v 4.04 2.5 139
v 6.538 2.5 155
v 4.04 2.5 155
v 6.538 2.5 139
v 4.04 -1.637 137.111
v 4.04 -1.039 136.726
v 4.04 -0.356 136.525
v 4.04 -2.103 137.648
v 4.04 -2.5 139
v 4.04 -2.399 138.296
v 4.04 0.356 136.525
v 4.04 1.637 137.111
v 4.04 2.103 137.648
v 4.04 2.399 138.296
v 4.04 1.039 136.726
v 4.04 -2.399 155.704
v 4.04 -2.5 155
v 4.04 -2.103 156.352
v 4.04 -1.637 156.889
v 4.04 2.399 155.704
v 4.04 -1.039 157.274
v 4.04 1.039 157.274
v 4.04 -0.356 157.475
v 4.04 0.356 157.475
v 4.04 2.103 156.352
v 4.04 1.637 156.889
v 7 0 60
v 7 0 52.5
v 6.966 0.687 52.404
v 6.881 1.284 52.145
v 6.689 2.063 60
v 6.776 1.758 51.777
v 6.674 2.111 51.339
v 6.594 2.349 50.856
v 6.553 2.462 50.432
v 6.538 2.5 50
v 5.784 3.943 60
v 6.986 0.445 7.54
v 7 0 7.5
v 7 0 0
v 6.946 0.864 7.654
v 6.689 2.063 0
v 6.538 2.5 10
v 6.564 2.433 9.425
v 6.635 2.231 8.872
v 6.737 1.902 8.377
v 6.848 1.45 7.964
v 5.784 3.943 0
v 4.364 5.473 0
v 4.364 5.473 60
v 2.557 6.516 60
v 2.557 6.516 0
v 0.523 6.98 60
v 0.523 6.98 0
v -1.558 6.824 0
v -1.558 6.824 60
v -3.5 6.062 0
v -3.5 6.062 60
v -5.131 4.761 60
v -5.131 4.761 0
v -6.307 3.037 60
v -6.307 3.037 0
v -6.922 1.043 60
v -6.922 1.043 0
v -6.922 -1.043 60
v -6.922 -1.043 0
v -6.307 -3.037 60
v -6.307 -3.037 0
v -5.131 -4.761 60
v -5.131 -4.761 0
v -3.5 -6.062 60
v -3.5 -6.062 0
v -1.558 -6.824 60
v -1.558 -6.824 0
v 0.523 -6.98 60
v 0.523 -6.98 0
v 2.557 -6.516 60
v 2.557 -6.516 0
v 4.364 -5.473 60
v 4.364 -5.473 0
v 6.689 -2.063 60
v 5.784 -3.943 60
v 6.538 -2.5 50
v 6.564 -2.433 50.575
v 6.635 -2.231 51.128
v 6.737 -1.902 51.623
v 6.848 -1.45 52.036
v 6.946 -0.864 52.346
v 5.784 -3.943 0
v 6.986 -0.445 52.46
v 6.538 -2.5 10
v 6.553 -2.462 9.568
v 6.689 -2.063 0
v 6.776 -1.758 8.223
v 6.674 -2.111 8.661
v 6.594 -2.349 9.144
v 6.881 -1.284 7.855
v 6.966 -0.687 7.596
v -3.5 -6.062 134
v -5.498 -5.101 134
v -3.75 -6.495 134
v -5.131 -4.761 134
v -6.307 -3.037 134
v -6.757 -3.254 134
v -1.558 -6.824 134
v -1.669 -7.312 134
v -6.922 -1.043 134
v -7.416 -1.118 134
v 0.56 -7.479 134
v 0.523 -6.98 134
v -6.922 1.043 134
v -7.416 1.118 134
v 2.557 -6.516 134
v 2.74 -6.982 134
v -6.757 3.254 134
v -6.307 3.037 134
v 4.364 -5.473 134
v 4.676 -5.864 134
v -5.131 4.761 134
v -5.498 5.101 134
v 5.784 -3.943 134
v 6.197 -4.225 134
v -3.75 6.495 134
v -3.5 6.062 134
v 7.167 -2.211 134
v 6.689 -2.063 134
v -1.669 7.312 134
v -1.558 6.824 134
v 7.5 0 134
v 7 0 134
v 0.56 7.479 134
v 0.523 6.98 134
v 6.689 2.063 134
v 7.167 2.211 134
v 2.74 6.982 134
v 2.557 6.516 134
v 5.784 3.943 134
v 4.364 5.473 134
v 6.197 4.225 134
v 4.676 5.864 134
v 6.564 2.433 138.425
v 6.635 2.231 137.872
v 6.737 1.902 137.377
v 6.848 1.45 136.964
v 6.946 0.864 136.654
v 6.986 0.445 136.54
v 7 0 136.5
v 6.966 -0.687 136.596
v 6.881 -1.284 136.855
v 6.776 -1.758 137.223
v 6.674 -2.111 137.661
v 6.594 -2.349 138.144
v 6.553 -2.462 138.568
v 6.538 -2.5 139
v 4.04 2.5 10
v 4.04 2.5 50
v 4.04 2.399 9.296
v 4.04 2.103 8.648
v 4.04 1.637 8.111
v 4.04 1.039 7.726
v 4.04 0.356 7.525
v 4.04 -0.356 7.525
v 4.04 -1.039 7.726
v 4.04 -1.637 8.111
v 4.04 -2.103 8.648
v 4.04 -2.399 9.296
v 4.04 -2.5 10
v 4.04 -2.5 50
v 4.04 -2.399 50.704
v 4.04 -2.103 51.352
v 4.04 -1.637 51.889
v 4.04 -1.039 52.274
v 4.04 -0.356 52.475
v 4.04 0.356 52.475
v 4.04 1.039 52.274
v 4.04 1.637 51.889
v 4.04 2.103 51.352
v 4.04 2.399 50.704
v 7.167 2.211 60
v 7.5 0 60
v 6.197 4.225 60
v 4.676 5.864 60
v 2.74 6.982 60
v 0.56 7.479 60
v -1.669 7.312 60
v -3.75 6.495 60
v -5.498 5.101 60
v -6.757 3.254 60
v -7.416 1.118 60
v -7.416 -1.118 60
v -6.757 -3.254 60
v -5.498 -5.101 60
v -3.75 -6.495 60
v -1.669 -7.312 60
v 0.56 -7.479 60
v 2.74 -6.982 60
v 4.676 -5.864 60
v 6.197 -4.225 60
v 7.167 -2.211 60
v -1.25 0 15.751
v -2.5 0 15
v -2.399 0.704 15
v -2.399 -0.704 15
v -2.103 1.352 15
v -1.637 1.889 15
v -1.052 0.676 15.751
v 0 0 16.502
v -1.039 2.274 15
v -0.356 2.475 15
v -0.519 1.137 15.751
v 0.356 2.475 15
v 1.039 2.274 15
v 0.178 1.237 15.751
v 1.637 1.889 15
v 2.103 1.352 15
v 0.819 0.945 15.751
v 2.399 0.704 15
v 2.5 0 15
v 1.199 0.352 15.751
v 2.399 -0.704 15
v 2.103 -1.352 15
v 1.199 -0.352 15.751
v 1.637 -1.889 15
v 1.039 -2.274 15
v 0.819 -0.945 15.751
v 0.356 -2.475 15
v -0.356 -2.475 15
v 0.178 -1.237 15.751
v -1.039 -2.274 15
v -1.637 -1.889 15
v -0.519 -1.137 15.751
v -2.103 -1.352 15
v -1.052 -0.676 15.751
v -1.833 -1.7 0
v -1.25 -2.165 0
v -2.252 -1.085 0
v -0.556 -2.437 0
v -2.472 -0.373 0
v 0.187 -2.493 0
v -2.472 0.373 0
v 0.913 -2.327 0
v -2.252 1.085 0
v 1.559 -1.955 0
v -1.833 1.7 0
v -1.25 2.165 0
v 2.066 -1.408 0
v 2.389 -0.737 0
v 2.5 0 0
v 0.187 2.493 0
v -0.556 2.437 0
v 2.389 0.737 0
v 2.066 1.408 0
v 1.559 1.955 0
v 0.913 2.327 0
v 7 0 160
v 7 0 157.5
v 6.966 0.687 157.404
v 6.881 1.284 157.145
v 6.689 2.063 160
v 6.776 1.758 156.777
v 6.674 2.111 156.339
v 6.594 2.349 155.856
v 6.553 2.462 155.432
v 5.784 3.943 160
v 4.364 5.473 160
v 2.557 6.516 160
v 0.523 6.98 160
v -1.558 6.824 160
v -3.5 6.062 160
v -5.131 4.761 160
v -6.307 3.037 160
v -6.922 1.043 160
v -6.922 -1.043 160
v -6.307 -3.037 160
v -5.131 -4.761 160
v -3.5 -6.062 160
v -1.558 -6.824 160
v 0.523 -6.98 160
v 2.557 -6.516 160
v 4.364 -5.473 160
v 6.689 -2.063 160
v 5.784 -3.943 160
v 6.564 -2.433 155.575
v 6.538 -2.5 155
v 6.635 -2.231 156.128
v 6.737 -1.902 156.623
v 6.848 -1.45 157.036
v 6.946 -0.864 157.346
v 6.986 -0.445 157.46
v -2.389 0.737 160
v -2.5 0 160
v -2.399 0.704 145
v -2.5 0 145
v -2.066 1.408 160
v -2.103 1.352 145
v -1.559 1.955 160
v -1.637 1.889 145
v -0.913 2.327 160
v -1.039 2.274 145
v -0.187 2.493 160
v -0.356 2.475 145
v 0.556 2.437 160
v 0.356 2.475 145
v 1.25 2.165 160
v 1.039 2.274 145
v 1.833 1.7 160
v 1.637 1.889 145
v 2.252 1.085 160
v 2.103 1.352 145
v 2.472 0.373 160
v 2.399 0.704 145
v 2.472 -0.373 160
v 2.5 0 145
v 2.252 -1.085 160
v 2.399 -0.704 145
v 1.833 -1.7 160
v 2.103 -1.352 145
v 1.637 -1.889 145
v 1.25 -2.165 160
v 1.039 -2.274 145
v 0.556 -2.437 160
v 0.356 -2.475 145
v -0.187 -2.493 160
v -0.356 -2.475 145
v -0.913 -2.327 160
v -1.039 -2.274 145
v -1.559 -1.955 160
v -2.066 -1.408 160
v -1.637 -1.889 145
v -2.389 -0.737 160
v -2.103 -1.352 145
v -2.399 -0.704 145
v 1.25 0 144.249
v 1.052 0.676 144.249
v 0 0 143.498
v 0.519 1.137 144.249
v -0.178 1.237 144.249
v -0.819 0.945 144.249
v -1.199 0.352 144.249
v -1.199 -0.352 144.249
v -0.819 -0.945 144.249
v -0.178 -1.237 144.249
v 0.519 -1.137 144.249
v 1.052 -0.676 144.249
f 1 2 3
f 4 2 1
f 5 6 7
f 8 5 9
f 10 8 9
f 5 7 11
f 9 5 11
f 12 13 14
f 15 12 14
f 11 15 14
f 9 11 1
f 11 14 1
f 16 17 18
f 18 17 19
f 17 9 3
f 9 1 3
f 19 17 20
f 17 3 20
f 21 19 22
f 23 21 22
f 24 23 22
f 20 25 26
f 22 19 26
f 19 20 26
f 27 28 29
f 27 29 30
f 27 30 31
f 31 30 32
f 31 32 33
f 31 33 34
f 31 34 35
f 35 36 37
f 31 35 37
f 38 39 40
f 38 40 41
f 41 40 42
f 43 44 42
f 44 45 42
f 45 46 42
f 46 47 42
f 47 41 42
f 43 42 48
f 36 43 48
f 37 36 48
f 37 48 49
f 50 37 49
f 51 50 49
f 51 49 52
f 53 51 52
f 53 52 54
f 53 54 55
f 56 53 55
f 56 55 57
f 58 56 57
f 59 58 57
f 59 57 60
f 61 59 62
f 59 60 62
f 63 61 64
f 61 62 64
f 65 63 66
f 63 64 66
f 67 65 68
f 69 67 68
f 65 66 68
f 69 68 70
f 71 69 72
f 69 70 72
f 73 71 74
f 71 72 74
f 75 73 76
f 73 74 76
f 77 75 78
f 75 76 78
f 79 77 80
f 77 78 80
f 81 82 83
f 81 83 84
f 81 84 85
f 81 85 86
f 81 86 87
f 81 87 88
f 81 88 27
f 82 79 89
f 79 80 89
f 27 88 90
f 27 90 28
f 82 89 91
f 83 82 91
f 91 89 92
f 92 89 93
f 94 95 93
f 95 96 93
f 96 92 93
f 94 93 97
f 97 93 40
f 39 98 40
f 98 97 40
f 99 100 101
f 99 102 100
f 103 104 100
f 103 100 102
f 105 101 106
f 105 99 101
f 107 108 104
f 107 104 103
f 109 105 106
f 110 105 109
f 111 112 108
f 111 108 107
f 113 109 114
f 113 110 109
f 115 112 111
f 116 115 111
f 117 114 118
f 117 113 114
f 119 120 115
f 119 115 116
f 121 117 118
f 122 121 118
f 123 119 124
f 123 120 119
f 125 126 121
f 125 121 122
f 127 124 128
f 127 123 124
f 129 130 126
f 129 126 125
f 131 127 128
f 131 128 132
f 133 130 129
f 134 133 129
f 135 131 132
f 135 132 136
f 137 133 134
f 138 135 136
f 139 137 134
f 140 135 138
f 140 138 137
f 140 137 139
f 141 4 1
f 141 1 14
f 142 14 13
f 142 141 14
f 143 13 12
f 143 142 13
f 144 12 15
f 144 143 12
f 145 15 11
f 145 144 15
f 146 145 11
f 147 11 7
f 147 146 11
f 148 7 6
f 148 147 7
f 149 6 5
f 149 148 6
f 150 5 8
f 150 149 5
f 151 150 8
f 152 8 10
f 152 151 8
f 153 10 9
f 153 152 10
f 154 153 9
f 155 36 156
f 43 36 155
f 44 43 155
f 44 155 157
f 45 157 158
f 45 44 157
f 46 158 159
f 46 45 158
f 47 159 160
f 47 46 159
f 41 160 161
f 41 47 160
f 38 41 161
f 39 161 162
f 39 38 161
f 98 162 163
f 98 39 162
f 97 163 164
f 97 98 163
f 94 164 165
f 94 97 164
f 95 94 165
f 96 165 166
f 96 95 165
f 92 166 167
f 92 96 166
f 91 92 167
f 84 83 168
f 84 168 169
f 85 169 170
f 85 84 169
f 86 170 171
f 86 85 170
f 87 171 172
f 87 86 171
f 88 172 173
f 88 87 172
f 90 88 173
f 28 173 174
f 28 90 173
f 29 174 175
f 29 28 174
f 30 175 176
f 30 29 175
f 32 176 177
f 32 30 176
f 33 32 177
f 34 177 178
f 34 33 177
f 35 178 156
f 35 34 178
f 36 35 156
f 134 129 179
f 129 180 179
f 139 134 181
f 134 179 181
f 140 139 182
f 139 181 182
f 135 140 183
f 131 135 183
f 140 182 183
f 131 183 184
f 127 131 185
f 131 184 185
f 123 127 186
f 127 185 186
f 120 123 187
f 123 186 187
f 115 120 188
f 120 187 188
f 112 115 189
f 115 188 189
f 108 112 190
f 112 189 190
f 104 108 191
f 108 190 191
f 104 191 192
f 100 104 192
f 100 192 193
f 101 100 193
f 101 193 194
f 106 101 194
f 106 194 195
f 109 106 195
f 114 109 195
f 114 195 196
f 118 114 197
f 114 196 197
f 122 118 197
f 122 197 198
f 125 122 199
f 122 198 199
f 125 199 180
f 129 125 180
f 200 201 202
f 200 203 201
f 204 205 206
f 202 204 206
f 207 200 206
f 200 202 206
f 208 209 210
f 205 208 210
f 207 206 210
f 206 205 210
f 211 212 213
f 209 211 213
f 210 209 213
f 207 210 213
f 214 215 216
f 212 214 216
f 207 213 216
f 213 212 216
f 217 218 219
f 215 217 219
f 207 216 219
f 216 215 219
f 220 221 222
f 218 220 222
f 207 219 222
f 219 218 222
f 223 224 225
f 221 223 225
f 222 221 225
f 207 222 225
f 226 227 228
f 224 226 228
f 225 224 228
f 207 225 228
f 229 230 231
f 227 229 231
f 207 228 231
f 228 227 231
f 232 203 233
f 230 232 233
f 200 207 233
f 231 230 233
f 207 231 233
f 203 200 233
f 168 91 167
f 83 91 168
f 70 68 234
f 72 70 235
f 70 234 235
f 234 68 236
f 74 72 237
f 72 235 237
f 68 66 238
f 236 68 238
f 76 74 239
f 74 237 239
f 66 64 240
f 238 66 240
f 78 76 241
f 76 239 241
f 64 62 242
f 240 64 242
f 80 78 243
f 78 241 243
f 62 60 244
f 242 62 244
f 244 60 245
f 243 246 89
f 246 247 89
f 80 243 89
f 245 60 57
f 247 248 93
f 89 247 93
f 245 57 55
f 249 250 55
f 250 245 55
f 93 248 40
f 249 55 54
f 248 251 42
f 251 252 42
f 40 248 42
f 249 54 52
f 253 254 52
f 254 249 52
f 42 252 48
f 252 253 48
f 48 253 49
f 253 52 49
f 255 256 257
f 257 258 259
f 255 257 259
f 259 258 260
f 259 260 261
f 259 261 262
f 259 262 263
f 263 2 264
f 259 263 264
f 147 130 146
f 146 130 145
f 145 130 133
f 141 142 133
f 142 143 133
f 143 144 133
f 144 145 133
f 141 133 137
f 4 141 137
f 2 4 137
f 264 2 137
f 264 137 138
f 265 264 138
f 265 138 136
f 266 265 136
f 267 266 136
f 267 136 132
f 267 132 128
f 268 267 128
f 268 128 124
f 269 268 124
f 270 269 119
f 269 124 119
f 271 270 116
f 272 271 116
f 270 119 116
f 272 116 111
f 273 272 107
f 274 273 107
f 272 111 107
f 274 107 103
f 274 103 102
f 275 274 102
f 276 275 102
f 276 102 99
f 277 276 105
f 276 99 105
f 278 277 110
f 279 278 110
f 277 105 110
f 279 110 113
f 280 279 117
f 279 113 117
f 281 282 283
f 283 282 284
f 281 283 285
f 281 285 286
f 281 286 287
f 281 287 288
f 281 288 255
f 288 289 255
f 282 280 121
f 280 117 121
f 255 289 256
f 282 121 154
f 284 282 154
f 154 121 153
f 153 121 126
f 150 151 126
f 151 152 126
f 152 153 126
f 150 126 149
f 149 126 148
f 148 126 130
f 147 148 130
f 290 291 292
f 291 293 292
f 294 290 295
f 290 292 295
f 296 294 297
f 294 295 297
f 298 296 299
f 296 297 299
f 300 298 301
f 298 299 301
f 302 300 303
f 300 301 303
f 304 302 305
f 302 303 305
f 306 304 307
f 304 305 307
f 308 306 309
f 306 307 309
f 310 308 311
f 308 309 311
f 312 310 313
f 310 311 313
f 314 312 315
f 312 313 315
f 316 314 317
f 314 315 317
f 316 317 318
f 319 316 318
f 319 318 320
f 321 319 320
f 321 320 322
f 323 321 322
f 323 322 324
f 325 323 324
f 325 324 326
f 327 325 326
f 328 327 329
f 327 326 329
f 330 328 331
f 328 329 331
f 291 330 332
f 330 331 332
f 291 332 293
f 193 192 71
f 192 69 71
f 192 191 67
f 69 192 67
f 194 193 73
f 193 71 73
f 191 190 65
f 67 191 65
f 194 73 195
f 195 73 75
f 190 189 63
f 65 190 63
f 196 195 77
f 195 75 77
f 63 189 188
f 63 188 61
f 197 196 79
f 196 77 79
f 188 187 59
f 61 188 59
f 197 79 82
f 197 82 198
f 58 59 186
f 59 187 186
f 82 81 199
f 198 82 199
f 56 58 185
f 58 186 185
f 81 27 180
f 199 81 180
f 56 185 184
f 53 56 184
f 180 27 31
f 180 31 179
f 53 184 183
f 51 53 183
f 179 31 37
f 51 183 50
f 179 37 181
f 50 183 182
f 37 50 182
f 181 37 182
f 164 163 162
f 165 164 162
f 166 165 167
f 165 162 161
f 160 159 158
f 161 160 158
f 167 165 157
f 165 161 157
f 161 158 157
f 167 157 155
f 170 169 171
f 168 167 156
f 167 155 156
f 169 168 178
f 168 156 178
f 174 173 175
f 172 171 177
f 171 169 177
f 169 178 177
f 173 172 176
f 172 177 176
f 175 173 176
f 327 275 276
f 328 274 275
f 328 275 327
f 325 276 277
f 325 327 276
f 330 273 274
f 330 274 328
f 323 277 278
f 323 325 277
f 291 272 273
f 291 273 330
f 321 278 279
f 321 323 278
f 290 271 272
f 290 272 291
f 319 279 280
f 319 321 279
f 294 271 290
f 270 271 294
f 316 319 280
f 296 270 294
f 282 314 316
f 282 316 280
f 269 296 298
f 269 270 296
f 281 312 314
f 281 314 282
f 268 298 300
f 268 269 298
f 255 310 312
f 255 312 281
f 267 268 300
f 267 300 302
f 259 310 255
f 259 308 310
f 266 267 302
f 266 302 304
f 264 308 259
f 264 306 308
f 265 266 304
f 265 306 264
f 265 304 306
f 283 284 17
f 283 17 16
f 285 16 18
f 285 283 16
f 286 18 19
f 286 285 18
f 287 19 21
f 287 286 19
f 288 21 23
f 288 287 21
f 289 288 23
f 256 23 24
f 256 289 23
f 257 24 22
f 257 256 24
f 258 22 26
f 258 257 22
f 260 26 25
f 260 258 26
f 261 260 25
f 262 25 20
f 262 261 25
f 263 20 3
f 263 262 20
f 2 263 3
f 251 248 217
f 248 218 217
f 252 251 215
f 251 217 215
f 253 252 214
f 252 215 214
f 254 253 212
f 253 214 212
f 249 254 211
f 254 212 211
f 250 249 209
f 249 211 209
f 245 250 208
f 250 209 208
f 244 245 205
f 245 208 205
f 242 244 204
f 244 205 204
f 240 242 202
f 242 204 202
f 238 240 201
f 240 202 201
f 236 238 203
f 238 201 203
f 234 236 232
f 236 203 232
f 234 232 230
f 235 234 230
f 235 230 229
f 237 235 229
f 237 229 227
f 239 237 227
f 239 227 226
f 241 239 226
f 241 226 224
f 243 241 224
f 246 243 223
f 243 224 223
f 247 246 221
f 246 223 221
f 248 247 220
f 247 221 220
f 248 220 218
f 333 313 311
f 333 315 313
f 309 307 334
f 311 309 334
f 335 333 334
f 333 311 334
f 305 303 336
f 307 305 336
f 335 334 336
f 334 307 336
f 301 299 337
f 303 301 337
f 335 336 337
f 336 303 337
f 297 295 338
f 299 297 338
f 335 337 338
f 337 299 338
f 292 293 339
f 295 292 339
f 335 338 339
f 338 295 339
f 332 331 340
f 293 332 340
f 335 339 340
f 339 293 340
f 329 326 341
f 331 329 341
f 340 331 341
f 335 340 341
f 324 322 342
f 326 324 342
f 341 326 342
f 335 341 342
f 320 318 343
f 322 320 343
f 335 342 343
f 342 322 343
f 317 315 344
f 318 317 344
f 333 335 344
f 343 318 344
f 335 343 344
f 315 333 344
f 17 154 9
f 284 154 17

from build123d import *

# Parameters (mm, degrees)
ESQUISSE1_R                                   = 7
BOSS_EXTRU_1_DEPTH                            = 60
ESQUISSE3_R                                   = 7.5
BOSS_EXTRU_2_DEPTH                            = 62
ESQUISSE4_R                                   = 7.5
BOSS_EXTRU_3_DEPTH                            = 12
ESQUISSE5_R                                   = 7
BOSS_EXTRU_4_DEPTH                            = 26
ENL_V_MAT_EXTRU_1_DEPTH                       = 2.96
ENL_V_MAT_EXTRU_2_DEPTH                       = 2.96
TROU_POUR_TARAUDAGE_POUR_TROU_TARAUD_M6_D     = 5
TROU_POUR_TARAUDAGE_POUR_TROU_TARAUD_M6_DEPTH = 15
TROU_POUR_TARAUDAGE_POUR_TROU_TARAUD_M6_TIP   = 1.502151548
TROU_POUR_TARAUDAGE_POUR_TROU_TARAUD_2_D      = 5
TROU_POUR_TARAUDAGE_POUR_TROU_TARAUD_2_DEPTH  = 15
TROU_POUR_TARAUDAGE_POUR_TROU_TARAUD_2_TIP    = 1.502151548


with BuildPart() as part:
    # Esquisse1 → Boss.-Extru.1 (new body)
    with BuildSketch(Plane.XY):
        Circle(ESQUISSE1_R)
    extrude(amount=BOSS_EXTRU_1_DEPTH)

    # Esquisse3 → Boss.-Extru.2 (add)
    with BuildSketch(Plane.XY.offset(60)):
        Circle(ESQUISSE3_R)
    extrude(amount=BOSS_EXTRU_2_DEPTH)

    # Esquisse4 → Boss.-Extru.3 (add)
    with BuildSketch(Plane.XY.offset(122)):
        Circle(ESQUISSE4_R)
    extrude(amount=BOSS_EXTRU_3_DEPTH)

    # Esquisse5 → Boss.-Extru.4 (add)
    with BuildSketch(Plane.XY.offset(134)):
        Circle(ESQUISSE5_R)
    extrude(amount=BOSS_EXTRU_4_DEPTH)

    # Esquisse7 → Enlèv. mat.-Extru.1 (cut)
    with BuildSketch(Plane(origin=(7, 0, 0), x_dir=(0, 0, -1), z_dir=(1, 0, 0))):
        with BuildLine():
            Line((-155, 2.5), (-139, 2.5))
            ThreePointArc((-139, 2.5), (-136.5, 0), (-139, -2.5))
            Line((-139, -2.5), (-155, -2.5))
            ThreePointArc((-155, -2.5), (-157.5, 0), (-155, 2.5))
        make_face()
    extrude(amount=-ENL_V_MAT_EXTRU_1_DEPTH, mode=Mode.SUBTRACT)

    # Esquisse8 → Enlèv. mat.-Extru.2 (cut)
    with BuildSketch(Plane(origin=(7, 0, 0), x_dir=(0, 0, -1), z_dir=(1, 0, 0))):
        with BuildLine():
            Line((-10, -2.5), (-50, -2.5))
            ThreePointArc((-50, -2.5), (-52.5, 0), (-50, 2.5))
            Line((-50, 2.5), (-10, 2.5))
            ThreePointArc((-10, 2.5), (-7.5, 0), (-10, -2.5))
        make_face()
    extrude(amount=-ENL_V_MAT_EXTRU_2_DEPTH, mode=Mode.SUBTRACT)

    # Trou pour taraudage pour trou taraud_ M6
    with Locations(Plane(origin=(0, 0, 0), x_dir=(-1, 0, 0), z_dir=(0, 0, -1))):
        with Locations((0, 0)):
            Hole(TROU_POUR_TARAUDAGE_POUR_TROU_TARAUD_M6_D / 2, depth=TROU_POUR_TARAUDAGE_POUR_TROU_TARAUD_M6_DEPTH)
            with Locations((0, 0, -(TROU_POUR_TARAUDAGE_POUR_TROU_TARAUD_M6_DEPTH + TROU_POUR_TARAUDAGE_POUR_TROU_TARAUD_M6_TIP / 2))):  # 118° drill point
                Cone(0, TROU_POUR_TARAUDAGE_POUR_TROU_TARAUD_M6_D / 2, TROU_POUR_TARAUDAGE_POUR_TROU_TARAUD_M6_TIP, mode=Mode.SUBTRACT)

    # Trou pour taraudage pour trou taraud 2
    with Locations(Plane.XY.offset(160)):
        with Locations((0, 0)):
            Hole(TROU_POUR_TARAUDAGE_POUR_TROU_TARAUD_2_D / 2, depth=TROU_POUR_TARAUDAGE_POUR_TROU_TARAUD_2_DEPTH)
            with Locations((0, 0, -(TROU_POUR_TARAUDAGE_POUR_TROU_TARAUD_2_DEPTH + TROU_POUR_TARAUDAGE_POUR_TROU_TARAUD_2_TIP / 2))):  # 118° drill point
                Cone(0, TROU_POUR_TARAUDAGE_POUR_TROU_TARAUD_2_D / 2, TROU_POUR_TARAUDAGE_POUR_TROU_TARAUD_2_TIP, mode=Mode.SUBTRACT)


solid = part.part
